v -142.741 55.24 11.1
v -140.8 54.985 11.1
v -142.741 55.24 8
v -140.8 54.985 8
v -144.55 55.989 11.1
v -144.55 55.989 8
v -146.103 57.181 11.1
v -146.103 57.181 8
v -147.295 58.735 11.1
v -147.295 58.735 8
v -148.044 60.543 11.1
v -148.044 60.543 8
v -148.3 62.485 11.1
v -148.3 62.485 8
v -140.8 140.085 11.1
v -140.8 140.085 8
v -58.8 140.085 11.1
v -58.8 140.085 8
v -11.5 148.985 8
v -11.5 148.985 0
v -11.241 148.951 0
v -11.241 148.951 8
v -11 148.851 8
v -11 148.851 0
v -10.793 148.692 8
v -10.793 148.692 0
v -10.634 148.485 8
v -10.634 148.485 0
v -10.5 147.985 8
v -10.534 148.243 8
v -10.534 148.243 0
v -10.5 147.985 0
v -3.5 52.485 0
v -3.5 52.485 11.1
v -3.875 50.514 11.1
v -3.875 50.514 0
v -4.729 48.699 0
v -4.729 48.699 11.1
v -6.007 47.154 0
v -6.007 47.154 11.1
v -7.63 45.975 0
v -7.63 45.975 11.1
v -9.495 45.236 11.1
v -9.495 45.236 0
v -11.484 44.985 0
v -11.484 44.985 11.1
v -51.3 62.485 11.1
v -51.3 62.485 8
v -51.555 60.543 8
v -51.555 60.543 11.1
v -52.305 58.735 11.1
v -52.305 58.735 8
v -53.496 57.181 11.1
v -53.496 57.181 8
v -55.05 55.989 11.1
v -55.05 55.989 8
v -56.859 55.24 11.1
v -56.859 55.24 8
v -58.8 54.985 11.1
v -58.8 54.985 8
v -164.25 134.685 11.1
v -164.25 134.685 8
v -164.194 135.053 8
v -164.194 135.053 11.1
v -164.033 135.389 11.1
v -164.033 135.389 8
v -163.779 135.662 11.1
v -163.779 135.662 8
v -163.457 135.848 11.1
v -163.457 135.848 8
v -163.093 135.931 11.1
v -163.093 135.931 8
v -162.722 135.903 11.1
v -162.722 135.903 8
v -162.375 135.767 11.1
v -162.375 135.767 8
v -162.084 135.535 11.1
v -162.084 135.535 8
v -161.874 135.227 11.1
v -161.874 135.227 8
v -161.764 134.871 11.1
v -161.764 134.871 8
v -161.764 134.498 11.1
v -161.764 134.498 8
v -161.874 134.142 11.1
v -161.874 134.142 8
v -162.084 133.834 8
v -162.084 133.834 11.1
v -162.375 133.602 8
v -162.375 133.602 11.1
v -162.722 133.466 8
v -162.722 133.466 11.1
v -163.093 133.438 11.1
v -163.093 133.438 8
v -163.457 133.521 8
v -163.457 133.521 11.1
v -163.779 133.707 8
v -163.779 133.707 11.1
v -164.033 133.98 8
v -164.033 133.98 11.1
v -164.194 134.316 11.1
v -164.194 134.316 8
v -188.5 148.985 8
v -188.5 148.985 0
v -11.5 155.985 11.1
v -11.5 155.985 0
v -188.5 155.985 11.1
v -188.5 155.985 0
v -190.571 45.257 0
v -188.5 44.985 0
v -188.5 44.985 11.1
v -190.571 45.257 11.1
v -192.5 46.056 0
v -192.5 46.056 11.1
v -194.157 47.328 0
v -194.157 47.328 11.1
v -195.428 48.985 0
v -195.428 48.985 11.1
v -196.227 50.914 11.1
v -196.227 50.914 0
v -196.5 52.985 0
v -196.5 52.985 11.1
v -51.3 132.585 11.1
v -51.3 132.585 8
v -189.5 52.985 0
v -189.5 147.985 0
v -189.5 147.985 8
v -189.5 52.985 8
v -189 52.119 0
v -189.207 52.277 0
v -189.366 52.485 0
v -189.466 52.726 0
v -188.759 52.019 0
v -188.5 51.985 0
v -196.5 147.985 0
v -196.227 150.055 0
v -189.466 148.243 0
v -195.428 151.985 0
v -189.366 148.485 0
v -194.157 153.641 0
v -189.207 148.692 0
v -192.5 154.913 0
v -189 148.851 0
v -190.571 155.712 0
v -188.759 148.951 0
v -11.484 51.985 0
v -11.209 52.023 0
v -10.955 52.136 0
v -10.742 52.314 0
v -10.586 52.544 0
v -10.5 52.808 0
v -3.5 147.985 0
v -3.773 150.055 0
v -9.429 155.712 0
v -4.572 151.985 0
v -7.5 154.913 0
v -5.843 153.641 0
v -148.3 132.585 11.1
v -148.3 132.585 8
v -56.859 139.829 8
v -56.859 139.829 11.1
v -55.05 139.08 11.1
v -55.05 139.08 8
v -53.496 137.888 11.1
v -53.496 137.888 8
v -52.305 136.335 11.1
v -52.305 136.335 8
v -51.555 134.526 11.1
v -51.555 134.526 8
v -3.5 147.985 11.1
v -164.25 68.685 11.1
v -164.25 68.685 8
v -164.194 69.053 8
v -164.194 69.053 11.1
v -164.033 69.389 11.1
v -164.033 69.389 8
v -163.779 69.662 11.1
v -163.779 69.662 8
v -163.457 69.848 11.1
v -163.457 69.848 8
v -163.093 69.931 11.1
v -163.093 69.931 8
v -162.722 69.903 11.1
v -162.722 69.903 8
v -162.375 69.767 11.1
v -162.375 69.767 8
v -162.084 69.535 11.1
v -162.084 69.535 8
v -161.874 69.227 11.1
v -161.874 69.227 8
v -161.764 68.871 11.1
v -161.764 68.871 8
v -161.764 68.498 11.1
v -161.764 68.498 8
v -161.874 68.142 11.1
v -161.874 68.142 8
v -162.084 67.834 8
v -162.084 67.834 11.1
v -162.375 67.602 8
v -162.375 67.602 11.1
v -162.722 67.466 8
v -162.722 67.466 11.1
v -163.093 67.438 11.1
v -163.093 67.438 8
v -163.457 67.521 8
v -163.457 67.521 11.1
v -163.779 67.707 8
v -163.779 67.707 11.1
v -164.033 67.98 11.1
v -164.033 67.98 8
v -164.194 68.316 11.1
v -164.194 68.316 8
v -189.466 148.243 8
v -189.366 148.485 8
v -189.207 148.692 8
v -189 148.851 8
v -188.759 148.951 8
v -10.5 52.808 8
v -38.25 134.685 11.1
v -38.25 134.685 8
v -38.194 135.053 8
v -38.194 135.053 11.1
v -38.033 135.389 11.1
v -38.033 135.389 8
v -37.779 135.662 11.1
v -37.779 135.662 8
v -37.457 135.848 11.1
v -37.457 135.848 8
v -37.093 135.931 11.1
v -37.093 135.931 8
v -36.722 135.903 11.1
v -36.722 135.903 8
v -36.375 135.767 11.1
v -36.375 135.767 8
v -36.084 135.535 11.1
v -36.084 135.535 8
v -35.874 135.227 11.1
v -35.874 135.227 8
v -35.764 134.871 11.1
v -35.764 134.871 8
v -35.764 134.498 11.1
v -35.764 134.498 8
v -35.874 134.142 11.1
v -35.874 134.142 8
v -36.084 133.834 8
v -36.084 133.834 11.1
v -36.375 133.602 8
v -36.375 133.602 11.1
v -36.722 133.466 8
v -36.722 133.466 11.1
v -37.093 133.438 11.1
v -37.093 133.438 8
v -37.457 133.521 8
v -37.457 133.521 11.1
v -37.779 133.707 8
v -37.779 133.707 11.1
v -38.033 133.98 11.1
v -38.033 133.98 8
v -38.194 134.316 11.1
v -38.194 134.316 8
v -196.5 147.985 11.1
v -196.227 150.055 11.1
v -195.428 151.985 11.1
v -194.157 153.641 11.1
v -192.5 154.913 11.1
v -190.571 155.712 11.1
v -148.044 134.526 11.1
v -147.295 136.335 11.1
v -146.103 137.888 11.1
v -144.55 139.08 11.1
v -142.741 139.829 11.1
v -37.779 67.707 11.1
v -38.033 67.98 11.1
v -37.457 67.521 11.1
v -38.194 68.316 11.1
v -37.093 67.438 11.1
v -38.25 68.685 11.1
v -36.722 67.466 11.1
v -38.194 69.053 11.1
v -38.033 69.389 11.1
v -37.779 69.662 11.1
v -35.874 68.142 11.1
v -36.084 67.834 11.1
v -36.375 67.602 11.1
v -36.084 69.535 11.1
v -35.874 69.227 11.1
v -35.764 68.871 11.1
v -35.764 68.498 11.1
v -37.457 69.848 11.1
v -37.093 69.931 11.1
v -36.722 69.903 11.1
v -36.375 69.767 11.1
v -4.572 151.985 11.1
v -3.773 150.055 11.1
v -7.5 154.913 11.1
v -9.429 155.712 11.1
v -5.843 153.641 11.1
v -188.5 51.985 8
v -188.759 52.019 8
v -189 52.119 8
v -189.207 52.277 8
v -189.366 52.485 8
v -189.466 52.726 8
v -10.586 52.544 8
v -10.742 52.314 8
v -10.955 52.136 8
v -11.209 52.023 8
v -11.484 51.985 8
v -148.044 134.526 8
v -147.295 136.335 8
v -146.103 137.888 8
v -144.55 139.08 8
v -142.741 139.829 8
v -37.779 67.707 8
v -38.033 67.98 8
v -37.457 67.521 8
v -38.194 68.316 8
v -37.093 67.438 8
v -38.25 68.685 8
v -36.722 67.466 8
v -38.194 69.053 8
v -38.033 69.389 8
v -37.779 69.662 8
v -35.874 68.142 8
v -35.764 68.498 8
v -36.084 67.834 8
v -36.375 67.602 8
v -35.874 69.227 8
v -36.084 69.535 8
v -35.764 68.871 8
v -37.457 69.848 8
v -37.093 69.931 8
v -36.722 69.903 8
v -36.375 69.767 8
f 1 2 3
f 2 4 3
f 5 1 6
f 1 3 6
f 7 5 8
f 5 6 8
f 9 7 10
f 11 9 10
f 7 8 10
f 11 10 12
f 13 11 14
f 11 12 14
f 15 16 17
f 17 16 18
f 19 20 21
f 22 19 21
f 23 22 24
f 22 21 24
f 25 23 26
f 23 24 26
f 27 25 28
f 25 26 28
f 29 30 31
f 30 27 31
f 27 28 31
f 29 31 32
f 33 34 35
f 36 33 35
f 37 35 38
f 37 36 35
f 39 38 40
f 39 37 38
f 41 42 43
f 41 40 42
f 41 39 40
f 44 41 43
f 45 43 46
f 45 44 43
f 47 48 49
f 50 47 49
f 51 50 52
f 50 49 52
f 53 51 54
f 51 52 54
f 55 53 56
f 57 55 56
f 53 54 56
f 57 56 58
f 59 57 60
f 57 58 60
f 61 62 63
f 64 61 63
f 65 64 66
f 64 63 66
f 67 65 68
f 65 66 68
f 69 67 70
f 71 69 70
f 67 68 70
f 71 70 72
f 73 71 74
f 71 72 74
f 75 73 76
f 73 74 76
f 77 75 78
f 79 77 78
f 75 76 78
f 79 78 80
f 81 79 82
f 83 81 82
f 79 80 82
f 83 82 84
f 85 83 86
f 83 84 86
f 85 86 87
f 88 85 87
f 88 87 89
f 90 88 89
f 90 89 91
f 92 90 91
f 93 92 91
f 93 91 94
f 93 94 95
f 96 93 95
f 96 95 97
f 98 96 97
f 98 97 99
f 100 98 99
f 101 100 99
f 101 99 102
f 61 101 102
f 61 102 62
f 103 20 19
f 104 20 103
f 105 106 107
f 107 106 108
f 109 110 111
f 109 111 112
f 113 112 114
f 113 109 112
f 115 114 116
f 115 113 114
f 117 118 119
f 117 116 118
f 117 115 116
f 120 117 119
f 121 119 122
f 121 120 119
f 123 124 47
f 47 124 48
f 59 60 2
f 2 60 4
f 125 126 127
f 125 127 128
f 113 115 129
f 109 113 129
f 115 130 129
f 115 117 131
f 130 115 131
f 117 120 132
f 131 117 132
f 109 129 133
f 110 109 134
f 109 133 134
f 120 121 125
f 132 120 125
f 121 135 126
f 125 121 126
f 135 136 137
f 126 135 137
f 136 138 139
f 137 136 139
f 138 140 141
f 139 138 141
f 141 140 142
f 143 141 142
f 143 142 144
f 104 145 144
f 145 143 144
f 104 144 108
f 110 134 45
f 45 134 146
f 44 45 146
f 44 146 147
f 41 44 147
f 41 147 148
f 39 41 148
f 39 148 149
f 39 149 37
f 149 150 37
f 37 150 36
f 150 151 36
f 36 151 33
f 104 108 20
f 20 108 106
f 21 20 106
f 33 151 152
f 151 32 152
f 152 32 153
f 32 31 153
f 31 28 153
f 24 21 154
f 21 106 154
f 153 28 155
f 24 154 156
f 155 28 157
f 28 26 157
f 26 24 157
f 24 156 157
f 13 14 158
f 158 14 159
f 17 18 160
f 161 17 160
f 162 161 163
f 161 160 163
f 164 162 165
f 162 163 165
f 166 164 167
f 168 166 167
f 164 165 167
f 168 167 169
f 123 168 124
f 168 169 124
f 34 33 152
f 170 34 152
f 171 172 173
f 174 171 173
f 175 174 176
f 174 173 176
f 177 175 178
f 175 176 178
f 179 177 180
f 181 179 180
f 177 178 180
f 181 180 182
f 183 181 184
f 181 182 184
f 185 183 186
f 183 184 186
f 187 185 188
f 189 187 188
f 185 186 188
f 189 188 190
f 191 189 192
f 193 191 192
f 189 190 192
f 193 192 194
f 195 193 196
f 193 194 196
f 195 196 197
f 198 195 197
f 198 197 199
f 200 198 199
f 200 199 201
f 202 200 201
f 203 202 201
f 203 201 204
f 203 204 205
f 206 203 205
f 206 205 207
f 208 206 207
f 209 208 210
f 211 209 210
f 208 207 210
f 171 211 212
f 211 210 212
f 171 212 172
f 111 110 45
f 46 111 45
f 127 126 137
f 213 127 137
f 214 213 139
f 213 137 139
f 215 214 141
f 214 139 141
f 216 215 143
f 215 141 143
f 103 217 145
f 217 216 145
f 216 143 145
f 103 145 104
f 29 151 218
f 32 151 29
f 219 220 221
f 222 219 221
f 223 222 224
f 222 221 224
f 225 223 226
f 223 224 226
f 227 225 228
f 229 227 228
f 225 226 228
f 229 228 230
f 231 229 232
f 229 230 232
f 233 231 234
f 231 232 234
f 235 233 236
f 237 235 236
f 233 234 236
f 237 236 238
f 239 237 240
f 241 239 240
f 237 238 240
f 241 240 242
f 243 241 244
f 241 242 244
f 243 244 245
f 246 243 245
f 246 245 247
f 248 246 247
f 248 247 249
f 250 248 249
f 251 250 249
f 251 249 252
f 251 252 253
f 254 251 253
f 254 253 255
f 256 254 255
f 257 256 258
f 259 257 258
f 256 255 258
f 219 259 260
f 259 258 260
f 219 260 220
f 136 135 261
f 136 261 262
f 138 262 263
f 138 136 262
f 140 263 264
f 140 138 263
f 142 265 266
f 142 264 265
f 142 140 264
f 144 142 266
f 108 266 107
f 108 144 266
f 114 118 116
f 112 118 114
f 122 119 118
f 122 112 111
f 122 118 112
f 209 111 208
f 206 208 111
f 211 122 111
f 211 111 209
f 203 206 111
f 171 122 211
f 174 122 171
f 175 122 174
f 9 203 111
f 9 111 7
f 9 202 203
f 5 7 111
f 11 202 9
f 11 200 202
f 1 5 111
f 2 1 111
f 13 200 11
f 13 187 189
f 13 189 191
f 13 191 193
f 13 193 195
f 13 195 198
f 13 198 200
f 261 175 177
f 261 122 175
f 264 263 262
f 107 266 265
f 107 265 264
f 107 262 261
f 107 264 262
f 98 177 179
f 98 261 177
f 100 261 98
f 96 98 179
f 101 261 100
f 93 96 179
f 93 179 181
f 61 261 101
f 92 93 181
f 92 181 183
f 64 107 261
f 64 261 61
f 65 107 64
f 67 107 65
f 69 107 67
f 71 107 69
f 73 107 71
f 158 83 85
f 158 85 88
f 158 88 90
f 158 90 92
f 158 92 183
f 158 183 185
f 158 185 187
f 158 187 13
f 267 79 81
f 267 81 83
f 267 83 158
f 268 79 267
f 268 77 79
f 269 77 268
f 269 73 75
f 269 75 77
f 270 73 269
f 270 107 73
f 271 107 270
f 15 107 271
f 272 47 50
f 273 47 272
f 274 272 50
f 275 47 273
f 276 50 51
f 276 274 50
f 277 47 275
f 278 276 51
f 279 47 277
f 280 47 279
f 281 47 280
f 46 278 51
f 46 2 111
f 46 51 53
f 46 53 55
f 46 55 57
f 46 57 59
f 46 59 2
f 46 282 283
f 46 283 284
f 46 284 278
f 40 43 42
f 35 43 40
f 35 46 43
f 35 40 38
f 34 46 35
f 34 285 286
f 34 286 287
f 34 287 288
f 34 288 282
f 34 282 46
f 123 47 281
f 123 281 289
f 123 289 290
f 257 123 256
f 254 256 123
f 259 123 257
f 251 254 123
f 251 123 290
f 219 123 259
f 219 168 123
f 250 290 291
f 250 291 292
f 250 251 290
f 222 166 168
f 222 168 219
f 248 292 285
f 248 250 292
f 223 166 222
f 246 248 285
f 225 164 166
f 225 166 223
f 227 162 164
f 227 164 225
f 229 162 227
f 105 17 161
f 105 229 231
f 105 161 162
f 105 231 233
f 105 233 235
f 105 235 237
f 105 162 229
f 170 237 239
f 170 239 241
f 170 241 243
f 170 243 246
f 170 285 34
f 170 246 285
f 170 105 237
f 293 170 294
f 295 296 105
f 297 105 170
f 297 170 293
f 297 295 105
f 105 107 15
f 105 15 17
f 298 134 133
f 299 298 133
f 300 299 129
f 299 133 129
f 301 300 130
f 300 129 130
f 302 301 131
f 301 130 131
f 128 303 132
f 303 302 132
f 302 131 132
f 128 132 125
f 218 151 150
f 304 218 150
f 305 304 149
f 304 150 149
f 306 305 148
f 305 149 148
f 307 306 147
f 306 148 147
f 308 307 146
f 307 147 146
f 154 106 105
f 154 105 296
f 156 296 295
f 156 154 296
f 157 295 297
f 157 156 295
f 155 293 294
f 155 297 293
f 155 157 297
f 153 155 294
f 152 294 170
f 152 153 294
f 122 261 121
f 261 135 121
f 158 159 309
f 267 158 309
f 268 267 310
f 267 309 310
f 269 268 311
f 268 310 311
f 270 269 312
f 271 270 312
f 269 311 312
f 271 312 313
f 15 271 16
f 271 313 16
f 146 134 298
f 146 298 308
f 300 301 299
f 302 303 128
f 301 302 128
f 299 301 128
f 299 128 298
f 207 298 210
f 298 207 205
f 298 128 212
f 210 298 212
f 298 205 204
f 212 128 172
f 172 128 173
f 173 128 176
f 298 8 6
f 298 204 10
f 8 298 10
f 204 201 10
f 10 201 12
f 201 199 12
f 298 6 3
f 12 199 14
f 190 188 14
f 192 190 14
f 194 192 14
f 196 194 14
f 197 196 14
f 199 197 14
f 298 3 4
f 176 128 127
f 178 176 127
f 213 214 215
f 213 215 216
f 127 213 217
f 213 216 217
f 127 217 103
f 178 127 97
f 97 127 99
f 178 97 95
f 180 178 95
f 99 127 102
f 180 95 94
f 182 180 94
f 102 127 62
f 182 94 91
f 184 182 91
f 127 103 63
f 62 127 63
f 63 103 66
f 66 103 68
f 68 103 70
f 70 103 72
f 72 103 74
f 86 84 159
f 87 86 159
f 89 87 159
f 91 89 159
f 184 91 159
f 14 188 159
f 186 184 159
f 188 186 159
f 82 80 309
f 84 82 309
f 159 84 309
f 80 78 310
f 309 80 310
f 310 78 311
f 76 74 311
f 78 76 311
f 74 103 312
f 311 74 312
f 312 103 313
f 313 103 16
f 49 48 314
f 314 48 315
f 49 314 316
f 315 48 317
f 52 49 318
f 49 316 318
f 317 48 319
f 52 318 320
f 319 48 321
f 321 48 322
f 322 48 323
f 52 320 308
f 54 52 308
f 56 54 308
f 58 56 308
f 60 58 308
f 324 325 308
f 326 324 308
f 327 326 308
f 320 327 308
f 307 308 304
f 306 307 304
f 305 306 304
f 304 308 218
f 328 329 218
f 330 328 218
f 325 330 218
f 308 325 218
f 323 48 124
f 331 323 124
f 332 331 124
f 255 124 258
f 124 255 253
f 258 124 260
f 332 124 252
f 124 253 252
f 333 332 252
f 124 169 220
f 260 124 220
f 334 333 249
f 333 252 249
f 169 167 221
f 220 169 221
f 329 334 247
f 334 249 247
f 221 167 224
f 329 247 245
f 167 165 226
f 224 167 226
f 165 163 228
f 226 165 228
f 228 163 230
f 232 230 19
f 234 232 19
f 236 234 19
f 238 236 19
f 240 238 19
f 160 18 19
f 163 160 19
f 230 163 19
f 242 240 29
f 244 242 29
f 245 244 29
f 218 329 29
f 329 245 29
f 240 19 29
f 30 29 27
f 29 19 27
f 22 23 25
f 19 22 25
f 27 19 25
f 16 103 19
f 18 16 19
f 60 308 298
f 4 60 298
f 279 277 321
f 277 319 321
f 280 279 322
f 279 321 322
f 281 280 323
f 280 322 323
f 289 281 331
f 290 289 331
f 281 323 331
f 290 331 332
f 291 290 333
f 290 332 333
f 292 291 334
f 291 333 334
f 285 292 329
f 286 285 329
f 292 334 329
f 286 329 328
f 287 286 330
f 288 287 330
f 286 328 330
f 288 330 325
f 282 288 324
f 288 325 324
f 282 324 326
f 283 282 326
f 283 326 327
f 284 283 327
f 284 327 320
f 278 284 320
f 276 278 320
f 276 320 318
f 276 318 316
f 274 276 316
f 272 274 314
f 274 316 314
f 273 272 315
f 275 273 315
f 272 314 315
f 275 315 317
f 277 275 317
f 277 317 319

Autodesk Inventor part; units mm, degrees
ref_plane "Work Plane5" through (-196, 0, 0) normal (0, 0, 1) x (1, 0, 0)
sketch "Sketch13" plane through (-196, 0, 0) normal (0, 0, 1) x (1, 0, 0)
  line L0 (7.5, 44.9846) -> (184.5156, 44.9846)
  line L1 (192.5, 52.4846) -> (192.5, 147.9846)
  line L2 (184.5, 155.9846) -> (7.5, 155.9846)
  line L3 (-0.5, 147.9846) -> (-0.5, 52.9846)
  arc A0 (-0.5, 52.9846) -> (7.5, 44.9846) centre (7.5, 52.9846) ccw
  arc A1 (184.5156, 44.9846) -> (192.5, 52.4846) centre (184.5156, 52.9846) ccw
  arc A2 (7.5, 155.9846) -> (-0.5, 147.9846) centre (7.5, 147.9846) ccw
  arc A3 (192.5, 147.9846) -> (184.5, 155.9846) centre (184.5, 147.9846) ccw
  line L4 (6.5, 147.9846) -> (6.5, 52.9846)
  arc A4 (6.5, 52.9846) -> (7.5, 51.9846) centre (7.5, 52.9846) ccw
  line L5 (7.5, 51.9846) -> (184.5156, 51.9846)
  arc A5 (184.5156, 51.9846) -> (185.5, 52.8084) centre (184.5156, 52.9846) ccw
  line L6 (185.5, 52.8084) -> (185.5, 147.9846)
  arc A6 (185.5, 147.9846) -> (184.5, 148.9846) centre (184.5, 147.9846) ccw
  line L7 (184.5, 148.9846) -> (7.5, 148.9846)
  arc A7 (7.5, 148.9846) -> (6.5, 147.9846) centre (7.5, 147.9846) ccw
  point P0 (-0.5, 44.9846)
  point P1 (192.5, 155.9846)
  point P2 (192.5, 44.9846)
  point P3 (-0.5, 155.9846)
  dimension "d79" = 8
  dimension "d112" = 8
  dimension "d117" = 7
extrude "Extrusion9" add sketch "Sketch13" along normal blind 11.1
ref_plane "Work Plane6" through (-196, 0, 0) normal (0, 0, -1) x (-1, 0, 0)
sketch "Sketch14" plane through (-196, 0, 0) normal (0, 0, -1) x (-1, 0, 0)
  line L0 (-144.7002, 132.1649) -> (-144.7002, 67.5846)
  line L1 (-47.7002, 67.5846) -> (-47.7002, 132.5846)
  line L2 (-55.2002, 140.0846) -> (-137.2002, 140.0846)
  line L3 (-144.7002, 132.5846) -> (-144.7002, 132.1649)
  arc A0 (-137.2002, 140.0846) -> (-144.7002, 132.5846) centre (-137.2002, 132.5846) ccw
  arc A1 (-47.7002, 132.5846) -> (-55.2002, 140.0846) centre (-55.2002, 132.5846) ccw
  line L4 (-192.5, 100.2346) -> (-248.457, 100.2346)
  line L5 (-96, 155.9846) -> (-96, 209.6502)
  line L6 (-47.7002, 67.5846) -> (-47.7002, 62.4846)
  line L7 (-144.7002, 67.5846) -> (-144.7002, 62.4846)
  line L8 (-137.2002, 54.9846) -> (-55.2002, 54.9846)
  arc A2 (-55.2002, 54.9846) -> (-47.7002, 62.4846) centre (-55.2002, 62.4846) ccw
  arc A3 (-144.7002, 62.4846) -> (-137.2002, 54.9846) centre (-137.2002, 62.4846) ccw
  line L9 (-184.5, 155.9846) -> (-7.5, 155.9846) projected
  line L10 (-192.5, 52.4846) -> (-192.5, 147.9846) projected
  line L11 (0.5, 147.9846) -> (0.5, 52.9846) projected
  line L12 (0.5, 147.9846) -> (0.5, 163.3157)
  line L13 (0.5, 163.3157) -> (-33.72, 163.3157)
  circle A4 centre (-159, 134.6846) radius 1.25
  line L14 (-159, 134.6846) -> (-159, 68.6846)
  circle A5 centre (-159, 68.6846) radius 1.25
  line L15 (-159, 68.6846) -> (-33, 68.6846)
  circle A6 centre (-33, 68.6846) radius 1.25
  line L16 (-33, 68.6846) -> (-33, 134.6846)
  circle A7 centre (-33, 134.6846) radius 1.25
  line L17 (-184.5156, 51.9846) -> (-7.5, 51.9846) projected
  point P0 (-196, 0)
  point P1 (-181.3, 148.9846)
  point P2 (-13.3, 148.9846)
  point P3 (-47.7002, 140.0846)
  point P4 (-144.7002, 140.0846)
  dimension "d80" = 97
  dimension "d83" = 7.5
  dimension "d111" = 7.5
  dimension "d126" = 34.22
  dimension "d132" = 2.5
  dimension "d133" = 33.5
  dimension "d134" = 21.3
  dimension "d135" = 66
  dimension "d136" = 2.5
  dimension "d138" = 126
  dimension "d139" = 2.5
  dimension "d140" = 2.5
  dimension "d142" = 3
ref_plane "Work Plane3" through (-196, 0, 0) normal (0, 0, -1) x (-1, 0, 0)
sketch "Sketch16" plane through (-196, 0, 0) normal (0, 0, -1) x (-1, 0, 0)
  line L0 (-181.3, 148.9846) -> (-6.5, 148.9846)
  line L1 (-6.5, 148.9846) -> (-6.5, 47)
  line L2 (-6.5, 47) -> (-181.3, 47)
  line L3 (-6.5, 52.9846) -> (-6.5, 147.9846) projected
  line L4 (-185.5, 147.9846) -> (-185.5, 52.8084) projected
  line L5 (-181.3, 47) -> (-185.5, 47)
  line L6 (-185.5, 47) -> (-185.5, 148.9846)
  line L7 (-185.5, 148.9846) -> (-6.5, 148.9846)
  line L8 (-6.5, 148.9846) -> (-185.5, 148.9846)
  point P0 (-196, 0)
extrude "Extrusion11" add sketch "Sketch16" against normal up to surface (11.1 mm away)
extrude "Extrusion12" cut sketch "Sketch14" against normal up to surface (11.1 mm away)
ref_plane "Work Plane2" through (-196, 0, 10) normal (0, 0, 1) x (1, 0, 0)
sketch "Sketch18" plane through (-196, 0, 10) normal (0, 0, 1) x (1, 0, 0)
  point P0 (196, 0)
extrude "Extrusion14" cut sketch "Sketch13" along normal blind 8 contours A7 L7 A6 L6 A5 L5 A4 L4
properties part number "Ventilator Screen Arm 01" material "PAEK Plastic"
